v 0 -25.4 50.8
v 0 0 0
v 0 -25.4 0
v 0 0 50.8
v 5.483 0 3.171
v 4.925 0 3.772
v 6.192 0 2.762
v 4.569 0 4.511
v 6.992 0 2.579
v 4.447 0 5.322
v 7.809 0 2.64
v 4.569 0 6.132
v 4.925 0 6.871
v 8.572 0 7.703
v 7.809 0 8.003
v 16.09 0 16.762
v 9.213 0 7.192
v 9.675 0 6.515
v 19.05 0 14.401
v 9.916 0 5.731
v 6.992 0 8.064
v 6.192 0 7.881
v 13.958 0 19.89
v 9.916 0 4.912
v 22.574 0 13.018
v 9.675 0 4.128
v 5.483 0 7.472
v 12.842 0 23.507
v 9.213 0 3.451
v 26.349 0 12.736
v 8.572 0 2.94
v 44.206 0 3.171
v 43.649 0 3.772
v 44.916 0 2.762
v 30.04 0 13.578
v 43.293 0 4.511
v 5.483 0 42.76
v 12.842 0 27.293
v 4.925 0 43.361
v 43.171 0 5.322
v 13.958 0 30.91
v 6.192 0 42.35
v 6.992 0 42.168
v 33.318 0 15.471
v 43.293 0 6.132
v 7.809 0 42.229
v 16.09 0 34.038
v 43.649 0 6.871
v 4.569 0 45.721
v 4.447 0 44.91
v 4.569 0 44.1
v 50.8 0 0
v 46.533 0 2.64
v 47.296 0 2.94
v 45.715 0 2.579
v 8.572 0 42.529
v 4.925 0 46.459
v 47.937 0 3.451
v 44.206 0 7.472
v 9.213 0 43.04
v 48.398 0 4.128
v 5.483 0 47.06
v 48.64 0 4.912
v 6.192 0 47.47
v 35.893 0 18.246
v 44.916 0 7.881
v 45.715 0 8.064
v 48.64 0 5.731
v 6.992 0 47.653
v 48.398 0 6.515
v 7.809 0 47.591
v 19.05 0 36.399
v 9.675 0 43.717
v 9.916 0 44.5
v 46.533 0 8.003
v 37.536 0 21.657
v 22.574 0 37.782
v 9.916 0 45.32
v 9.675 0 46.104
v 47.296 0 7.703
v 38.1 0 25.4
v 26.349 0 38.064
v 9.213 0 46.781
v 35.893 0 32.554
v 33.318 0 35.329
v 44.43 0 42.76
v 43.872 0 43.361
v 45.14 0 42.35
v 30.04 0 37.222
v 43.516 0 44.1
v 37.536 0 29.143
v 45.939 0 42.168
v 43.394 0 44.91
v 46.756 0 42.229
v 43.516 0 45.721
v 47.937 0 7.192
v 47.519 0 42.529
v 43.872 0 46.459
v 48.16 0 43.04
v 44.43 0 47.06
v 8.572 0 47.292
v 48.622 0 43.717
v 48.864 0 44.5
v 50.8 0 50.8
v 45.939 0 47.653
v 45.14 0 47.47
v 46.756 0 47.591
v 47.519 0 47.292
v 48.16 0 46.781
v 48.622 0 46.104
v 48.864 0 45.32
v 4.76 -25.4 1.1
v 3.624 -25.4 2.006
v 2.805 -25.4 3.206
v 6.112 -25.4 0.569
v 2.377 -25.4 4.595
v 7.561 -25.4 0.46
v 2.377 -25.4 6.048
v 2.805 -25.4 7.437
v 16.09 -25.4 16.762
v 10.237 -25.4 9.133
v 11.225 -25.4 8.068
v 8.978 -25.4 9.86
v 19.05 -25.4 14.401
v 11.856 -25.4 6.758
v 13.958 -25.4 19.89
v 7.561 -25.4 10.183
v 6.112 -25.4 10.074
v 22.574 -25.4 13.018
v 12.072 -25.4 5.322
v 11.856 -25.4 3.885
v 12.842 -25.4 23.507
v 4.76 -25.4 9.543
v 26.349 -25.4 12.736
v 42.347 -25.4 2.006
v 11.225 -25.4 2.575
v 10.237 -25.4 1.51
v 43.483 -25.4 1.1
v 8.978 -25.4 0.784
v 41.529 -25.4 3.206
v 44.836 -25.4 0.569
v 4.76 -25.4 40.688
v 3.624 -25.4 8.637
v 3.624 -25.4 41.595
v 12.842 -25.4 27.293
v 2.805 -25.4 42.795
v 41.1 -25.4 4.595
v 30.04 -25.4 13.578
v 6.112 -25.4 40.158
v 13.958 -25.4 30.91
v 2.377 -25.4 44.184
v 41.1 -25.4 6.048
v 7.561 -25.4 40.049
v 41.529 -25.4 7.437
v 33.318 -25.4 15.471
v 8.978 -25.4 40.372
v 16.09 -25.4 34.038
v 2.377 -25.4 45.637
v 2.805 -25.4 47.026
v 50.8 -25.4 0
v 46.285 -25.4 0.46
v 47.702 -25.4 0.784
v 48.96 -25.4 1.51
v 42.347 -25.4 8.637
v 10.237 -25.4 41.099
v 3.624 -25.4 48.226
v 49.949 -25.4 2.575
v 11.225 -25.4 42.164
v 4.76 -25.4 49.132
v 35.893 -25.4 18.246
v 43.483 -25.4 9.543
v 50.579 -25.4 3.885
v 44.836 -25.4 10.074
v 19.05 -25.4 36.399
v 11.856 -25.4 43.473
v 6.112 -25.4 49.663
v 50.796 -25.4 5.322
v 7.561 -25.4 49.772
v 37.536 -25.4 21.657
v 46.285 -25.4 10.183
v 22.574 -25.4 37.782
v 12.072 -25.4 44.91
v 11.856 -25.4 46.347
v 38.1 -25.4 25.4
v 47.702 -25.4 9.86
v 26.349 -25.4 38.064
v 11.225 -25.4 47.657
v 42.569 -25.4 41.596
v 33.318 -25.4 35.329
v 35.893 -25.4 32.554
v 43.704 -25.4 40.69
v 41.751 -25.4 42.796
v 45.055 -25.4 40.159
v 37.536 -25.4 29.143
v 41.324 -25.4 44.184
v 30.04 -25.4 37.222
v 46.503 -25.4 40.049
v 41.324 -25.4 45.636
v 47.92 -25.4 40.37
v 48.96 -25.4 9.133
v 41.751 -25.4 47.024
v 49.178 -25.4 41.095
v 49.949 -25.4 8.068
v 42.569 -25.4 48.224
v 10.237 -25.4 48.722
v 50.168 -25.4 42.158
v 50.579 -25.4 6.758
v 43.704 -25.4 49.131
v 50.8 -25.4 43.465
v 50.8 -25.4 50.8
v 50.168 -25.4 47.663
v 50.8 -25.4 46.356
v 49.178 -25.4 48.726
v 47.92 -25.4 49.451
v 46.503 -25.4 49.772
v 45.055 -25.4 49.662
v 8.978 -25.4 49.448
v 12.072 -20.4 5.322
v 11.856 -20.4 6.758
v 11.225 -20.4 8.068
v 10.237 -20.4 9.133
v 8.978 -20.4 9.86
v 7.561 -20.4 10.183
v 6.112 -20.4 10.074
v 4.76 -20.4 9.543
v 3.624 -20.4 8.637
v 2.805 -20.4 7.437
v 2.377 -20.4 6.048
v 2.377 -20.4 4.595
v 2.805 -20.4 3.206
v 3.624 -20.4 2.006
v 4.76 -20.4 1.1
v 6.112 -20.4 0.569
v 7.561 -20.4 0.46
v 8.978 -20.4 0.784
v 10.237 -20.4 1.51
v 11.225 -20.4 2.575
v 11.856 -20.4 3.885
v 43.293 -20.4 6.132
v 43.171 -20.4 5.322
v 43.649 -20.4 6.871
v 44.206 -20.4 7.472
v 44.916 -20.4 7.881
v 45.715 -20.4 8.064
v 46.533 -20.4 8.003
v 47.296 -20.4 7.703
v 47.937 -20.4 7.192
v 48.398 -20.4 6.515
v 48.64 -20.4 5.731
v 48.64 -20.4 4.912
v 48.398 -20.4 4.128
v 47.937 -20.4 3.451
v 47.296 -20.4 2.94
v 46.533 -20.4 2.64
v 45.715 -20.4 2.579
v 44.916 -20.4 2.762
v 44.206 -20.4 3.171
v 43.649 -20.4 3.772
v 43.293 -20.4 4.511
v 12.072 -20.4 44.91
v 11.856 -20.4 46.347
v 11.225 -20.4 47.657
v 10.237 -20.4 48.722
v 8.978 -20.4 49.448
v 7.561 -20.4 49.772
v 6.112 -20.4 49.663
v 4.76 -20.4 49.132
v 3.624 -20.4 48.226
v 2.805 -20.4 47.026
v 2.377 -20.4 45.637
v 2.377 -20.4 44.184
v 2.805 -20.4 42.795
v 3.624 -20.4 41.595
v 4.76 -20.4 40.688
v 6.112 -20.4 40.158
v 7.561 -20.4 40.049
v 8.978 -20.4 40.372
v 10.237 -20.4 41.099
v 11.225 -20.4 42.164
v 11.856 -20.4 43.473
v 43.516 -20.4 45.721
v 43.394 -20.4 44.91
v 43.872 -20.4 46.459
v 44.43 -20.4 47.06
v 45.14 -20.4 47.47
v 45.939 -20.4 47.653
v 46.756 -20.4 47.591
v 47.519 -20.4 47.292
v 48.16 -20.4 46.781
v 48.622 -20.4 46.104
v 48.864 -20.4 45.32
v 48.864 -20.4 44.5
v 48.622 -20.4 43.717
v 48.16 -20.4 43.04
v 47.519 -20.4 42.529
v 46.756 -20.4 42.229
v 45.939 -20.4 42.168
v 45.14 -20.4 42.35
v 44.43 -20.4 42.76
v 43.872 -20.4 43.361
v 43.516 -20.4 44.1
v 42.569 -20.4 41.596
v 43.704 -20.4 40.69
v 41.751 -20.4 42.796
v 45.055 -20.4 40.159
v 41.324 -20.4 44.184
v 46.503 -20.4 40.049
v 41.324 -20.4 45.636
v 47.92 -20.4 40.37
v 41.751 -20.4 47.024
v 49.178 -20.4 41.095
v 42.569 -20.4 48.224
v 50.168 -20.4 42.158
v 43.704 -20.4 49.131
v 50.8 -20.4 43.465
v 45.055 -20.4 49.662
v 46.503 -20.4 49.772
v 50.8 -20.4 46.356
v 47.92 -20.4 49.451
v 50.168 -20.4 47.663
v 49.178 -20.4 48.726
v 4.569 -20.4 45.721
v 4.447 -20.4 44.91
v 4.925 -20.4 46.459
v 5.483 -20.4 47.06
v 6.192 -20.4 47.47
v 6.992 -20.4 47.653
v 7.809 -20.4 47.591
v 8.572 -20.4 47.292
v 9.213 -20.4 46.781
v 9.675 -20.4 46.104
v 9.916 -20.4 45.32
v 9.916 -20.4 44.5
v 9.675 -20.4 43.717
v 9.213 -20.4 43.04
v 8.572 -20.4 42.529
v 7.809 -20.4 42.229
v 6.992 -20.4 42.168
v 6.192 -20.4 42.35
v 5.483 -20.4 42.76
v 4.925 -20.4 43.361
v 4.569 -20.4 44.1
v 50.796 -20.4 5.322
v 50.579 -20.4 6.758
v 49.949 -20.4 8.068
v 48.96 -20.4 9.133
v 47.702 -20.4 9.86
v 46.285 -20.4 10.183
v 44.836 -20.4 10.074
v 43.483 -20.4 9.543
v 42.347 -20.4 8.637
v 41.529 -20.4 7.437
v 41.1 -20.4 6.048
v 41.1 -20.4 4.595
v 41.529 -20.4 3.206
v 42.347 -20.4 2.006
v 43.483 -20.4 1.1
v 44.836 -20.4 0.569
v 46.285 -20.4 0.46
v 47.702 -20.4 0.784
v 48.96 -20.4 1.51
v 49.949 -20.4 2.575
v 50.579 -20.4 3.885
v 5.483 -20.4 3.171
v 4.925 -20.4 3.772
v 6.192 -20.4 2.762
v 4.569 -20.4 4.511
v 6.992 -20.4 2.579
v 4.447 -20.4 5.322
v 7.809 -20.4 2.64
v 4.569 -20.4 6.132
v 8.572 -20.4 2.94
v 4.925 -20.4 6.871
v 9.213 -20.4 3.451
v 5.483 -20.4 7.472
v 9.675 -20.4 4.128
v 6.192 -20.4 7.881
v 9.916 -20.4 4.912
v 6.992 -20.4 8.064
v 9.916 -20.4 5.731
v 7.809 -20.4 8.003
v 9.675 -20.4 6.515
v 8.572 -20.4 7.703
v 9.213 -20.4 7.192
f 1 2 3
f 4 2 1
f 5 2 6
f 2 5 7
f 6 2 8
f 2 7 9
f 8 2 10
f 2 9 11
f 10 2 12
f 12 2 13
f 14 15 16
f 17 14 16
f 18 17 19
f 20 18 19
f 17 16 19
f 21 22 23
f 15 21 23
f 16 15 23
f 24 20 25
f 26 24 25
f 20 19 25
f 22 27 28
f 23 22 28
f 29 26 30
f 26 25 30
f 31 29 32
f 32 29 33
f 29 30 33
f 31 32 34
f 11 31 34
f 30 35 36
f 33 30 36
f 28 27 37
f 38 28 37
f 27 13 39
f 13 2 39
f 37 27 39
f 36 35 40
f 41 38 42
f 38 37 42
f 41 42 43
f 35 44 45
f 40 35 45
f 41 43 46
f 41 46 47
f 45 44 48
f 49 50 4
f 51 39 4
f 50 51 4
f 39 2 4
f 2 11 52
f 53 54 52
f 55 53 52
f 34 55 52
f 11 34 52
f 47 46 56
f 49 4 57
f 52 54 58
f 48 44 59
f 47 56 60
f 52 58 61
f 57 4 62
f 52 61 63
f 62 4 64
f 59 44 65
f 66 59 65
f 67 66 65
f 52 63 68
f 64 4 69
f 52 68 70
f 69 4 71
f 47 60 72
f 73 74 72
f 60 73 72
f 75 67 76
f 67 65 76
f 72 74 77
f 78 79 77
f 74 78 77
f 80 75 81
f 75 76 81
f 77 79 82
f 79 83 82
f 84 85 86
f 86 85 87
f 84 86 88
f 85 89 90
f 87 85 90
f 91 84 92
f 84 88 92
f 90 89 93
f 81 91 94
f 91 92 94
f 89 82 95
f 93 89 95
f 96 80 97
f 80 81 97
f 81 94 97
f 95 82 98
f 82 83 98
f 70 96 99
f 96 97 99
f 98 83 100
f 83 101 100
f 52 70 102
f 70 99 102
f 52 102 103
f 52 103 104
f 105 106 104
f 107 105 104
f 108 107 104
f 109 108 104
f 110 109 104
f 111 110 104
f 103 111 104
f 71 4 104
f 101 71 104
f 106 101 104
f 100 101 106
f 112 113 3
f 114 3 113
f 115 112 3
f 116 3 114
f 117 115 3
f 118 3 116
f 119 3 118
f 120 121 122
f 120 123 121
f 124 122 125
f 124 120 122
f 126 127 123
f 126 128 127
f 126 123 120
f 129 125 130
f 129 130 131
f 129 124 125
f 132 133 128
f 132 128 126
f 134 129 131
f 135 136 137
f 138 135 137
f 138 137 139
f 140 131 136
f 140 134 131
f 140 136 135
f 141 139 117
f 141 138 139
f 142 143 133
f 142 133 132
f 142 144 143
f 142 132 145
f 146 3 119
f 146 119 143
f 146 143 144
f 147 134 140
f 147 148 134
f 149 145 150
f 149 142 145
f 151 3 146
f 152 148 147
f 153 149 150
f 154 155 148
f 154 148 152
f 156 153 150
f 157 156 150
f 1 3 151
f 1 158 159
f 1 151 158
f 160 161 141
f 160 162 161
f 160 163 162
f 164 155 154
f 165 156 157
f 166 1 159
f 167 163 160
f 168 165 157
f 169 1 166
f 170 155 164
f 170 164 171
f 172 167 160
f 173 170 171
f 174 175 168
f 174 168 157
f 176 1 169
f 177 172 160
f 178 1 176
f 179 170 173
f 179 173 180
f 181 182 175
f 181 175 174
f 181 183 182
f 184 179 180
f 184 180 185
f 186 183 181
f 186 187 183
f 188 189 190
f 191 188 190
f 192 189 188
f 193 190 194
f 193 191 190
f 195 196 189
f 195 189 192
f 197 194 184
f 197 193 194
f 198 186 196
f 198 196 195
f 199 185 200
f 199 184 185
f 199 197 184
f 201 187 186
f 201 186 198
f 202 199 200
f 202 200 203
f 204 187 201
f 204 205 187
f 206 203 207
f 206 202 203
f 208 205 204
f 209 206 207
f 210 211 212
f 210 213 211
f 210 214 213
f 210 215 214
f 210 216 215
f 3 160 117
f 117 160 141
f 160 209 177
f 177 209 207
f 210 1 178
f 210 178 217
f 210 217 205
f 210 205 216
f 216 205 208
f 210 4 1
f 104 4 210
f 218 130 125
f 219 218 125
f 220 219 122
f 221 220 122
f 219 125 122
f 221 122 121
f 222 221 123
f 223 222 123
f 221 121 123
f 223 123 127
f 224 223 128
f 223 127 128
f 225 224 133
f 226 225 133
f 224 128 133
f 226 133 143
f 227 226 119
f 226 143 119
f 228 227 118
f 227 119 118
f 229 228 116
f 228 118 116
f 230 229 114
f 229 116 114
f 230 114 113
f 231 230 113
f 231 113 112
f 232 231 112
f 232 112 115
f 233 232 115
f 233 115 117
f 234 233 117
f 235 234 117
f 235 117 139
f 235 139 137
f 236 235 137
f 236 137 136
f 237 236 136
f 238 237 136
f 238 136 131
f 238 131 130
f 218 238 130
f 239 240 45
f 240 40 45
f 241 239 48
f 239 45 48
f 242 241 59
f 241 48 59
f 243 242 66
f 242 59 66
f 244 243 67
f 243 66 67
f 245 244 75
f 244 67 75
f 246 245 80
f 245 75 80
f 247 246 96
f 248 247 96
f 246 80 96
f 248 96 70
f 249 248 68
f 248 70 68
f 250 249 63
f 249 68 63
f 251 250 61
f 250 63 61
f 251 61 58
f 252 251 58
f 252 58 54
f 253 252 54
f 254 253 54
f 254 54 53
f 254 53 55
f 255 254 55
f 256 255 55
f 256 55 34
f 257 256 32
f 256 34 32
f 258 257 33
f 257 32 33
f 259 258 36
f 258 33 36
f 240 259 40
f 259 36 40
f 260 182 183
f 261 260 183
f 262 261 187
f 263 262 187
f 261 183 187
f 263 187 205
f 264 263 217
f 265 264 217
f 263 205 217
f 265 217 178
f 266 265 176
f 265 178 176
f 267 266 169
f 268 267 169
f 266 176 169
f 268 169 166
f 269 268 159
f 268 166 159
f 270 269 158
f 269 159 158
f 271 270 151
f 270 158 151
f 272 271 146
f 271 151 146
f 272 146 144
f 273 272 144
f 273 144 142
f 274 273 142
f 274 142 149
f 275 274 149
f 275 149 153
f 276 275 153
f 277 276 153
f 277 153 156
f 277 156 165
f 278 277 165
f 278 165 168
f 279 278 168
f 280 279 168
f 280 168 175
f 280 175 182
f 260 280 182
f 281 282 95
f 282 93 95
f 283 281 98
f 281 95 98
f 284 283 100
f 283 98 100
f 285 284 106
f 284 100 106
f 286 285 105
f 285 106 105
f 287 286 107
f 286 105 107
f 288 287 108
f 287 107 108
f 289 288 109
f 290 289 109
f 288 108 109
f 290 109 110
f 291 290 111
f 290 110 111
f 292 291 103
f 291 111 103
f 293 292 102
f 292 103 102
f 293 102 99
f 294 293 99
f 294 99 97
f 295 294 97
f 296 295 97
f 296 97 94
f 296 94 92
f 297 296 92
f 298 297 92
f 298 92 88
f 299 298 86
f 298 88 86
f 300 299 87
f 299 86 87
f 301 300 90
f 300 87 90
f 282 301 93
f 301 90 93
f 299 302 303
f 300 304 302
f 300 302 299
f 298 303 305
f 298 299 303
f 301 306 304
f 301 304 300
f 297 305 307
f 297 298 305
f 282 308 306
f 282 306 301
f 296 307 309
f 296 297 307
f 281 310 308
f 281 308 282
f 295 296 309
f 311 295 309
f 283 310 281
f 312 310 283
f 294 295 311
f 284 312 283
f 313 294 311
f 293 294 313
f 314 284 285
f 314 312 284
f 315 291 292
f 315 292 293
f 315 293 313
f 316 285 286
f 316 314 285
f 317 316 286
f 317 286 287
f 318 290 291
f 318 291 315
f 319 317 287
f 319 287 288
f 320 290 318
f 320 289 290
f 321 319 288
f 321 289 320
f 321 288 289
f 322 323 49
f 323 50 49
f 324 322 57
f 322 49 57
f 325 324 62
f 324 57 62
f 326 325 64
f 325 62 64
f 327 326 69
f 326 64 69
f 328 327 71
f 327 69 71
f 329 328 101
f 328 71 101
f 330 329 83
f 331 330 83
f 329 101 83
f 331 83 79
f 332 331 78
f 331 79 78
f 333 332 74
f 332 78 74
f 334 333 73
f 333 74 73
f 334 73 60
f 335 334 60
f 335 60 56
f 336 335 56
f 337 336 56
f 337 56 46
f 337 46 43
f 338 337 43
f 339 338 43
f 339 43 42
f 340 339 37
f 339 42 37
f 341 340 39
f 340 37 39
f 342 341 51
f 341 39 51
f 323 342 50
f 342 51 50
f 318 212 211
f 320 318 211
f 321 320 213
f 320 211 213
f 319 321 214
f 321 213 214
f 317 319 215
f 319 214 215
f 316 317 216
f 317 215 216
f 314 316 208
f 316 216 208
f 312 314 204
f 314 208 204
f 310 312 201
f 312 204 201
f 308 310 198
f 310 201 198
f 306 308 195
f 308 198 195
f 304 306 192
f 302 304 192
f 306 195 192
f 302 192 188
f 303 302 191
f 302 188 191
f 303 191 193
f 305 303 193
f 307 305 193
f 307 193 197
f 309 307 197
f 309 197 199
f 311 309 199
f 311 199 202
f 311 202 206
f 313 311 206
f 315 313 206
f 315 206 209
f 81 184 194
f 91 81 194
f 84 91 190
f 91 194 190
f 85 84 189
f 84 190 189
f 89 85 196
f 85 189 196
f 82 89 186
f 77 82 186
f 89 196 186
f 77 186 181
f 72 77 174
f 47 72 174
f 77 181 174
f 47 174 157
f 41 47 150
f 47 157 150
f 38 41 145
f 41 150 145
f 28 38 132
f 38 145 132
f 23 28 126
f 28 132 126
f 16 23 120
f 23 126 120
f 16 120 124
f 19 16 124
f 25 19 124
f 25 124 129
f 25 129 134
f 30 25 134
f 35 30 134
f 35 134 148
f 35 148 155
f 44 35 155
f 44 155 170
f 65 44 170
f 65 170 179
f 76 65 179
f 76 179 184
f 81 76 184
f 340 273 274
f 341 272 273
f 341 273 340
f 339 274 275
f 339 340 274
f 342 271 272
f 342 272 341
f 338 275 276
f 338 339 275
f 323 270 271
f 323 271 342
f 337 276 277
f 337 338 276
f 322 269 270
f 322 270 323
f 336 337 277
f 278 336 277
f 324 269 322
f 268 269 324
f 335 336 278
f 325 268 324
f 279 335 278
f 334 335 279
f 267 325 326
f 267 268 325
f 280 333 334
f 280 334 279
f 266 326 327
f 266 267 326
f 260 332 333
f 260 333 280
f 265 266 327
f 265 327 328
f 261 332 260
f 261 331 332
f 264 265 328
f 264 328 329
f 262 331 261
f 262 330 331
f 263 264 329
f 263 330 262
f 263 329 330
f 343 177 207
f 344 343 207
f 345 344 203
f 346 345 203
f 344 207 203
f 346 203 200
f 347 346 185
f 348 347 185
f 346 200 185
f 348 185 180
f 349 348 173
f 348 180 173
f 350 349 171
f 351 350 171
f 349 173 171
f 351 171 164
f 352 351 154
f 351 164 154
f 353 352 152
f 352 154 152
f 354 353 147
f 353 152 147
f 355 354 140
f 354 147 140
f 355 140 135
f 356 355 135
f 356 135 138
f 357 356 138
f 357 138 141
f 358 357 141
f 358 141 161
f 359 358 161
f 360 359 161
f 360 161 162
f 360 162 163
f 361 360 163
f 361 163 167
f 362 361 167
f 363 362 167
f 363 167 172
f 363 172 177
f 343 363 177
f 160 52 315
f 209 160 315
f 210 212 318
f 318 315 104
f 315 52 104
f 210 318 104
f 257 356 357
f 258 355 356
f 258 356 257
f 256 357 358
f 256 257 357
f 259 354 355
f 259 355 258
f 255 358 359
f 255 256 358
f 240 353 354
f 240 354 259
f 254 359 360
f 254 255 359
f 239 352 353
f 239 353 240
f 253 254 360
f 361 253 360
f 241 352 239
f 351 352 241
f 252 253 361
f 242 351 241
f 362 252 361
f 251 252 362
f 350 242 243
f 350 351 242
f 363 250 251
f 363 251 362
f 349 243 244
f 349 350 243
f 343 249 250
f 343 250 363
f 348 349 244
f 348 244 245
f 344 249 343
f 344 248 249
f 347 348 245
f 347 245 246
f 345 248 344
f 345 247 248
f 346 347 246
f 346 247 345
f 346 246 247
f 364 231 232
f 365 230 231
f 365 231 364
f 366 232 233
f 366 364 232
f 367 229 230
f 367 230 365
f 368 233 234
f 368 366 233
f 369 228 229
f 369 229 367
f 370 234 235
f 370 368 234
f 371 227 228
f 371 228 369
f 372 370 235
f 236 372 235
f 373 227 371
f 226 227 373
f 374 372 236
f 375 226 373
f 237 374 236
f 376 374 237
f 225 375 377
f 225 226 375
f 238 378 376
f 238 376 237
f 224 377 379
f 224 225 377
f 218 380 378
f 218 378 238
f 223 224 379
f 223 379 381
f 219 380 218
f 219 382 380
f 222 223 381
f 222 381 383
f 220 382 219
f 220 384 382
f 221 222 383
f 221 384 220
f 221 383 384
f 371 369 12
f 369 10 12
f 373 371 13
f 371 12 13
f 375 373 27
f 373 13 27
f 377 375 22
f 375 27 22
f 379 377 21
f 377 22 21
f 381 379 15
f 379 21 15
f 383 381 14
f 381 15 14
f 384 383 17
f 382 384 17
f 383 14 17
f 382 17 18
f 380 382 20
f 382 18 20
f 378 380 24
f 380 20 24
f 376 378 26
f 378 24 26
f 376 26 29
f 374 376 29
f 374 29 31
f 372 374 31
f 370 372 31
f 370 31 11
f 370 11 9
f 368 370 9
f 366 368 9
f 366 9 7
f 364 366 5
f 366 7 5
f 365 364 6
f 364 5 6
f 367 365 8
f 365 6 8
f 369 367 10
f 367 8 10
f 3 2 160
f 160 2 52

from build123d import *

# Parameters (mm, degrees)
F0_W           = 50.8
F0_H           = 50.8
F1_DEPTH       = 25.4
F2_R           = 12.7
F3_DEPTH       = 25.401
F5_D           = 5.5
F5_CBORE_D     = 9.75
F5_CBORE_DEPTH = 5


with BuildPart() as f1:
    # F0 (on Front) → F1 (new body)
    with BuildSketch(Plane.XZ):
        with Locations((25.4, 25.4)):
            Rectangle(F0_W, F0_H)
    extrude(amount=F1_DEPTH)

    # F2 (on face) → F3 (cut, through all)
    with BuildSketch(Plane.XZ.offset(25.4)):
        with Locations((25.4, 25.4)):
            Circle(F2_R)
    extrude(amount=-F3_DEPTH, mode=Mode.SUBTRACT)

    # F5 (through all)
    with Locations(Plane.XZ.offset(25.4)):
        with Locations((7.1971733123, 44.9103601277), (46.1442172527, 44.9103601277), (45.92083022, 5.3215231746), (7.1971733123, 5.3215231746)):
            CounterBoreHole(F5_D / 2, F5_CBORE_D / 2, F5_CBORE_DEPTH)


solid = f1.part
